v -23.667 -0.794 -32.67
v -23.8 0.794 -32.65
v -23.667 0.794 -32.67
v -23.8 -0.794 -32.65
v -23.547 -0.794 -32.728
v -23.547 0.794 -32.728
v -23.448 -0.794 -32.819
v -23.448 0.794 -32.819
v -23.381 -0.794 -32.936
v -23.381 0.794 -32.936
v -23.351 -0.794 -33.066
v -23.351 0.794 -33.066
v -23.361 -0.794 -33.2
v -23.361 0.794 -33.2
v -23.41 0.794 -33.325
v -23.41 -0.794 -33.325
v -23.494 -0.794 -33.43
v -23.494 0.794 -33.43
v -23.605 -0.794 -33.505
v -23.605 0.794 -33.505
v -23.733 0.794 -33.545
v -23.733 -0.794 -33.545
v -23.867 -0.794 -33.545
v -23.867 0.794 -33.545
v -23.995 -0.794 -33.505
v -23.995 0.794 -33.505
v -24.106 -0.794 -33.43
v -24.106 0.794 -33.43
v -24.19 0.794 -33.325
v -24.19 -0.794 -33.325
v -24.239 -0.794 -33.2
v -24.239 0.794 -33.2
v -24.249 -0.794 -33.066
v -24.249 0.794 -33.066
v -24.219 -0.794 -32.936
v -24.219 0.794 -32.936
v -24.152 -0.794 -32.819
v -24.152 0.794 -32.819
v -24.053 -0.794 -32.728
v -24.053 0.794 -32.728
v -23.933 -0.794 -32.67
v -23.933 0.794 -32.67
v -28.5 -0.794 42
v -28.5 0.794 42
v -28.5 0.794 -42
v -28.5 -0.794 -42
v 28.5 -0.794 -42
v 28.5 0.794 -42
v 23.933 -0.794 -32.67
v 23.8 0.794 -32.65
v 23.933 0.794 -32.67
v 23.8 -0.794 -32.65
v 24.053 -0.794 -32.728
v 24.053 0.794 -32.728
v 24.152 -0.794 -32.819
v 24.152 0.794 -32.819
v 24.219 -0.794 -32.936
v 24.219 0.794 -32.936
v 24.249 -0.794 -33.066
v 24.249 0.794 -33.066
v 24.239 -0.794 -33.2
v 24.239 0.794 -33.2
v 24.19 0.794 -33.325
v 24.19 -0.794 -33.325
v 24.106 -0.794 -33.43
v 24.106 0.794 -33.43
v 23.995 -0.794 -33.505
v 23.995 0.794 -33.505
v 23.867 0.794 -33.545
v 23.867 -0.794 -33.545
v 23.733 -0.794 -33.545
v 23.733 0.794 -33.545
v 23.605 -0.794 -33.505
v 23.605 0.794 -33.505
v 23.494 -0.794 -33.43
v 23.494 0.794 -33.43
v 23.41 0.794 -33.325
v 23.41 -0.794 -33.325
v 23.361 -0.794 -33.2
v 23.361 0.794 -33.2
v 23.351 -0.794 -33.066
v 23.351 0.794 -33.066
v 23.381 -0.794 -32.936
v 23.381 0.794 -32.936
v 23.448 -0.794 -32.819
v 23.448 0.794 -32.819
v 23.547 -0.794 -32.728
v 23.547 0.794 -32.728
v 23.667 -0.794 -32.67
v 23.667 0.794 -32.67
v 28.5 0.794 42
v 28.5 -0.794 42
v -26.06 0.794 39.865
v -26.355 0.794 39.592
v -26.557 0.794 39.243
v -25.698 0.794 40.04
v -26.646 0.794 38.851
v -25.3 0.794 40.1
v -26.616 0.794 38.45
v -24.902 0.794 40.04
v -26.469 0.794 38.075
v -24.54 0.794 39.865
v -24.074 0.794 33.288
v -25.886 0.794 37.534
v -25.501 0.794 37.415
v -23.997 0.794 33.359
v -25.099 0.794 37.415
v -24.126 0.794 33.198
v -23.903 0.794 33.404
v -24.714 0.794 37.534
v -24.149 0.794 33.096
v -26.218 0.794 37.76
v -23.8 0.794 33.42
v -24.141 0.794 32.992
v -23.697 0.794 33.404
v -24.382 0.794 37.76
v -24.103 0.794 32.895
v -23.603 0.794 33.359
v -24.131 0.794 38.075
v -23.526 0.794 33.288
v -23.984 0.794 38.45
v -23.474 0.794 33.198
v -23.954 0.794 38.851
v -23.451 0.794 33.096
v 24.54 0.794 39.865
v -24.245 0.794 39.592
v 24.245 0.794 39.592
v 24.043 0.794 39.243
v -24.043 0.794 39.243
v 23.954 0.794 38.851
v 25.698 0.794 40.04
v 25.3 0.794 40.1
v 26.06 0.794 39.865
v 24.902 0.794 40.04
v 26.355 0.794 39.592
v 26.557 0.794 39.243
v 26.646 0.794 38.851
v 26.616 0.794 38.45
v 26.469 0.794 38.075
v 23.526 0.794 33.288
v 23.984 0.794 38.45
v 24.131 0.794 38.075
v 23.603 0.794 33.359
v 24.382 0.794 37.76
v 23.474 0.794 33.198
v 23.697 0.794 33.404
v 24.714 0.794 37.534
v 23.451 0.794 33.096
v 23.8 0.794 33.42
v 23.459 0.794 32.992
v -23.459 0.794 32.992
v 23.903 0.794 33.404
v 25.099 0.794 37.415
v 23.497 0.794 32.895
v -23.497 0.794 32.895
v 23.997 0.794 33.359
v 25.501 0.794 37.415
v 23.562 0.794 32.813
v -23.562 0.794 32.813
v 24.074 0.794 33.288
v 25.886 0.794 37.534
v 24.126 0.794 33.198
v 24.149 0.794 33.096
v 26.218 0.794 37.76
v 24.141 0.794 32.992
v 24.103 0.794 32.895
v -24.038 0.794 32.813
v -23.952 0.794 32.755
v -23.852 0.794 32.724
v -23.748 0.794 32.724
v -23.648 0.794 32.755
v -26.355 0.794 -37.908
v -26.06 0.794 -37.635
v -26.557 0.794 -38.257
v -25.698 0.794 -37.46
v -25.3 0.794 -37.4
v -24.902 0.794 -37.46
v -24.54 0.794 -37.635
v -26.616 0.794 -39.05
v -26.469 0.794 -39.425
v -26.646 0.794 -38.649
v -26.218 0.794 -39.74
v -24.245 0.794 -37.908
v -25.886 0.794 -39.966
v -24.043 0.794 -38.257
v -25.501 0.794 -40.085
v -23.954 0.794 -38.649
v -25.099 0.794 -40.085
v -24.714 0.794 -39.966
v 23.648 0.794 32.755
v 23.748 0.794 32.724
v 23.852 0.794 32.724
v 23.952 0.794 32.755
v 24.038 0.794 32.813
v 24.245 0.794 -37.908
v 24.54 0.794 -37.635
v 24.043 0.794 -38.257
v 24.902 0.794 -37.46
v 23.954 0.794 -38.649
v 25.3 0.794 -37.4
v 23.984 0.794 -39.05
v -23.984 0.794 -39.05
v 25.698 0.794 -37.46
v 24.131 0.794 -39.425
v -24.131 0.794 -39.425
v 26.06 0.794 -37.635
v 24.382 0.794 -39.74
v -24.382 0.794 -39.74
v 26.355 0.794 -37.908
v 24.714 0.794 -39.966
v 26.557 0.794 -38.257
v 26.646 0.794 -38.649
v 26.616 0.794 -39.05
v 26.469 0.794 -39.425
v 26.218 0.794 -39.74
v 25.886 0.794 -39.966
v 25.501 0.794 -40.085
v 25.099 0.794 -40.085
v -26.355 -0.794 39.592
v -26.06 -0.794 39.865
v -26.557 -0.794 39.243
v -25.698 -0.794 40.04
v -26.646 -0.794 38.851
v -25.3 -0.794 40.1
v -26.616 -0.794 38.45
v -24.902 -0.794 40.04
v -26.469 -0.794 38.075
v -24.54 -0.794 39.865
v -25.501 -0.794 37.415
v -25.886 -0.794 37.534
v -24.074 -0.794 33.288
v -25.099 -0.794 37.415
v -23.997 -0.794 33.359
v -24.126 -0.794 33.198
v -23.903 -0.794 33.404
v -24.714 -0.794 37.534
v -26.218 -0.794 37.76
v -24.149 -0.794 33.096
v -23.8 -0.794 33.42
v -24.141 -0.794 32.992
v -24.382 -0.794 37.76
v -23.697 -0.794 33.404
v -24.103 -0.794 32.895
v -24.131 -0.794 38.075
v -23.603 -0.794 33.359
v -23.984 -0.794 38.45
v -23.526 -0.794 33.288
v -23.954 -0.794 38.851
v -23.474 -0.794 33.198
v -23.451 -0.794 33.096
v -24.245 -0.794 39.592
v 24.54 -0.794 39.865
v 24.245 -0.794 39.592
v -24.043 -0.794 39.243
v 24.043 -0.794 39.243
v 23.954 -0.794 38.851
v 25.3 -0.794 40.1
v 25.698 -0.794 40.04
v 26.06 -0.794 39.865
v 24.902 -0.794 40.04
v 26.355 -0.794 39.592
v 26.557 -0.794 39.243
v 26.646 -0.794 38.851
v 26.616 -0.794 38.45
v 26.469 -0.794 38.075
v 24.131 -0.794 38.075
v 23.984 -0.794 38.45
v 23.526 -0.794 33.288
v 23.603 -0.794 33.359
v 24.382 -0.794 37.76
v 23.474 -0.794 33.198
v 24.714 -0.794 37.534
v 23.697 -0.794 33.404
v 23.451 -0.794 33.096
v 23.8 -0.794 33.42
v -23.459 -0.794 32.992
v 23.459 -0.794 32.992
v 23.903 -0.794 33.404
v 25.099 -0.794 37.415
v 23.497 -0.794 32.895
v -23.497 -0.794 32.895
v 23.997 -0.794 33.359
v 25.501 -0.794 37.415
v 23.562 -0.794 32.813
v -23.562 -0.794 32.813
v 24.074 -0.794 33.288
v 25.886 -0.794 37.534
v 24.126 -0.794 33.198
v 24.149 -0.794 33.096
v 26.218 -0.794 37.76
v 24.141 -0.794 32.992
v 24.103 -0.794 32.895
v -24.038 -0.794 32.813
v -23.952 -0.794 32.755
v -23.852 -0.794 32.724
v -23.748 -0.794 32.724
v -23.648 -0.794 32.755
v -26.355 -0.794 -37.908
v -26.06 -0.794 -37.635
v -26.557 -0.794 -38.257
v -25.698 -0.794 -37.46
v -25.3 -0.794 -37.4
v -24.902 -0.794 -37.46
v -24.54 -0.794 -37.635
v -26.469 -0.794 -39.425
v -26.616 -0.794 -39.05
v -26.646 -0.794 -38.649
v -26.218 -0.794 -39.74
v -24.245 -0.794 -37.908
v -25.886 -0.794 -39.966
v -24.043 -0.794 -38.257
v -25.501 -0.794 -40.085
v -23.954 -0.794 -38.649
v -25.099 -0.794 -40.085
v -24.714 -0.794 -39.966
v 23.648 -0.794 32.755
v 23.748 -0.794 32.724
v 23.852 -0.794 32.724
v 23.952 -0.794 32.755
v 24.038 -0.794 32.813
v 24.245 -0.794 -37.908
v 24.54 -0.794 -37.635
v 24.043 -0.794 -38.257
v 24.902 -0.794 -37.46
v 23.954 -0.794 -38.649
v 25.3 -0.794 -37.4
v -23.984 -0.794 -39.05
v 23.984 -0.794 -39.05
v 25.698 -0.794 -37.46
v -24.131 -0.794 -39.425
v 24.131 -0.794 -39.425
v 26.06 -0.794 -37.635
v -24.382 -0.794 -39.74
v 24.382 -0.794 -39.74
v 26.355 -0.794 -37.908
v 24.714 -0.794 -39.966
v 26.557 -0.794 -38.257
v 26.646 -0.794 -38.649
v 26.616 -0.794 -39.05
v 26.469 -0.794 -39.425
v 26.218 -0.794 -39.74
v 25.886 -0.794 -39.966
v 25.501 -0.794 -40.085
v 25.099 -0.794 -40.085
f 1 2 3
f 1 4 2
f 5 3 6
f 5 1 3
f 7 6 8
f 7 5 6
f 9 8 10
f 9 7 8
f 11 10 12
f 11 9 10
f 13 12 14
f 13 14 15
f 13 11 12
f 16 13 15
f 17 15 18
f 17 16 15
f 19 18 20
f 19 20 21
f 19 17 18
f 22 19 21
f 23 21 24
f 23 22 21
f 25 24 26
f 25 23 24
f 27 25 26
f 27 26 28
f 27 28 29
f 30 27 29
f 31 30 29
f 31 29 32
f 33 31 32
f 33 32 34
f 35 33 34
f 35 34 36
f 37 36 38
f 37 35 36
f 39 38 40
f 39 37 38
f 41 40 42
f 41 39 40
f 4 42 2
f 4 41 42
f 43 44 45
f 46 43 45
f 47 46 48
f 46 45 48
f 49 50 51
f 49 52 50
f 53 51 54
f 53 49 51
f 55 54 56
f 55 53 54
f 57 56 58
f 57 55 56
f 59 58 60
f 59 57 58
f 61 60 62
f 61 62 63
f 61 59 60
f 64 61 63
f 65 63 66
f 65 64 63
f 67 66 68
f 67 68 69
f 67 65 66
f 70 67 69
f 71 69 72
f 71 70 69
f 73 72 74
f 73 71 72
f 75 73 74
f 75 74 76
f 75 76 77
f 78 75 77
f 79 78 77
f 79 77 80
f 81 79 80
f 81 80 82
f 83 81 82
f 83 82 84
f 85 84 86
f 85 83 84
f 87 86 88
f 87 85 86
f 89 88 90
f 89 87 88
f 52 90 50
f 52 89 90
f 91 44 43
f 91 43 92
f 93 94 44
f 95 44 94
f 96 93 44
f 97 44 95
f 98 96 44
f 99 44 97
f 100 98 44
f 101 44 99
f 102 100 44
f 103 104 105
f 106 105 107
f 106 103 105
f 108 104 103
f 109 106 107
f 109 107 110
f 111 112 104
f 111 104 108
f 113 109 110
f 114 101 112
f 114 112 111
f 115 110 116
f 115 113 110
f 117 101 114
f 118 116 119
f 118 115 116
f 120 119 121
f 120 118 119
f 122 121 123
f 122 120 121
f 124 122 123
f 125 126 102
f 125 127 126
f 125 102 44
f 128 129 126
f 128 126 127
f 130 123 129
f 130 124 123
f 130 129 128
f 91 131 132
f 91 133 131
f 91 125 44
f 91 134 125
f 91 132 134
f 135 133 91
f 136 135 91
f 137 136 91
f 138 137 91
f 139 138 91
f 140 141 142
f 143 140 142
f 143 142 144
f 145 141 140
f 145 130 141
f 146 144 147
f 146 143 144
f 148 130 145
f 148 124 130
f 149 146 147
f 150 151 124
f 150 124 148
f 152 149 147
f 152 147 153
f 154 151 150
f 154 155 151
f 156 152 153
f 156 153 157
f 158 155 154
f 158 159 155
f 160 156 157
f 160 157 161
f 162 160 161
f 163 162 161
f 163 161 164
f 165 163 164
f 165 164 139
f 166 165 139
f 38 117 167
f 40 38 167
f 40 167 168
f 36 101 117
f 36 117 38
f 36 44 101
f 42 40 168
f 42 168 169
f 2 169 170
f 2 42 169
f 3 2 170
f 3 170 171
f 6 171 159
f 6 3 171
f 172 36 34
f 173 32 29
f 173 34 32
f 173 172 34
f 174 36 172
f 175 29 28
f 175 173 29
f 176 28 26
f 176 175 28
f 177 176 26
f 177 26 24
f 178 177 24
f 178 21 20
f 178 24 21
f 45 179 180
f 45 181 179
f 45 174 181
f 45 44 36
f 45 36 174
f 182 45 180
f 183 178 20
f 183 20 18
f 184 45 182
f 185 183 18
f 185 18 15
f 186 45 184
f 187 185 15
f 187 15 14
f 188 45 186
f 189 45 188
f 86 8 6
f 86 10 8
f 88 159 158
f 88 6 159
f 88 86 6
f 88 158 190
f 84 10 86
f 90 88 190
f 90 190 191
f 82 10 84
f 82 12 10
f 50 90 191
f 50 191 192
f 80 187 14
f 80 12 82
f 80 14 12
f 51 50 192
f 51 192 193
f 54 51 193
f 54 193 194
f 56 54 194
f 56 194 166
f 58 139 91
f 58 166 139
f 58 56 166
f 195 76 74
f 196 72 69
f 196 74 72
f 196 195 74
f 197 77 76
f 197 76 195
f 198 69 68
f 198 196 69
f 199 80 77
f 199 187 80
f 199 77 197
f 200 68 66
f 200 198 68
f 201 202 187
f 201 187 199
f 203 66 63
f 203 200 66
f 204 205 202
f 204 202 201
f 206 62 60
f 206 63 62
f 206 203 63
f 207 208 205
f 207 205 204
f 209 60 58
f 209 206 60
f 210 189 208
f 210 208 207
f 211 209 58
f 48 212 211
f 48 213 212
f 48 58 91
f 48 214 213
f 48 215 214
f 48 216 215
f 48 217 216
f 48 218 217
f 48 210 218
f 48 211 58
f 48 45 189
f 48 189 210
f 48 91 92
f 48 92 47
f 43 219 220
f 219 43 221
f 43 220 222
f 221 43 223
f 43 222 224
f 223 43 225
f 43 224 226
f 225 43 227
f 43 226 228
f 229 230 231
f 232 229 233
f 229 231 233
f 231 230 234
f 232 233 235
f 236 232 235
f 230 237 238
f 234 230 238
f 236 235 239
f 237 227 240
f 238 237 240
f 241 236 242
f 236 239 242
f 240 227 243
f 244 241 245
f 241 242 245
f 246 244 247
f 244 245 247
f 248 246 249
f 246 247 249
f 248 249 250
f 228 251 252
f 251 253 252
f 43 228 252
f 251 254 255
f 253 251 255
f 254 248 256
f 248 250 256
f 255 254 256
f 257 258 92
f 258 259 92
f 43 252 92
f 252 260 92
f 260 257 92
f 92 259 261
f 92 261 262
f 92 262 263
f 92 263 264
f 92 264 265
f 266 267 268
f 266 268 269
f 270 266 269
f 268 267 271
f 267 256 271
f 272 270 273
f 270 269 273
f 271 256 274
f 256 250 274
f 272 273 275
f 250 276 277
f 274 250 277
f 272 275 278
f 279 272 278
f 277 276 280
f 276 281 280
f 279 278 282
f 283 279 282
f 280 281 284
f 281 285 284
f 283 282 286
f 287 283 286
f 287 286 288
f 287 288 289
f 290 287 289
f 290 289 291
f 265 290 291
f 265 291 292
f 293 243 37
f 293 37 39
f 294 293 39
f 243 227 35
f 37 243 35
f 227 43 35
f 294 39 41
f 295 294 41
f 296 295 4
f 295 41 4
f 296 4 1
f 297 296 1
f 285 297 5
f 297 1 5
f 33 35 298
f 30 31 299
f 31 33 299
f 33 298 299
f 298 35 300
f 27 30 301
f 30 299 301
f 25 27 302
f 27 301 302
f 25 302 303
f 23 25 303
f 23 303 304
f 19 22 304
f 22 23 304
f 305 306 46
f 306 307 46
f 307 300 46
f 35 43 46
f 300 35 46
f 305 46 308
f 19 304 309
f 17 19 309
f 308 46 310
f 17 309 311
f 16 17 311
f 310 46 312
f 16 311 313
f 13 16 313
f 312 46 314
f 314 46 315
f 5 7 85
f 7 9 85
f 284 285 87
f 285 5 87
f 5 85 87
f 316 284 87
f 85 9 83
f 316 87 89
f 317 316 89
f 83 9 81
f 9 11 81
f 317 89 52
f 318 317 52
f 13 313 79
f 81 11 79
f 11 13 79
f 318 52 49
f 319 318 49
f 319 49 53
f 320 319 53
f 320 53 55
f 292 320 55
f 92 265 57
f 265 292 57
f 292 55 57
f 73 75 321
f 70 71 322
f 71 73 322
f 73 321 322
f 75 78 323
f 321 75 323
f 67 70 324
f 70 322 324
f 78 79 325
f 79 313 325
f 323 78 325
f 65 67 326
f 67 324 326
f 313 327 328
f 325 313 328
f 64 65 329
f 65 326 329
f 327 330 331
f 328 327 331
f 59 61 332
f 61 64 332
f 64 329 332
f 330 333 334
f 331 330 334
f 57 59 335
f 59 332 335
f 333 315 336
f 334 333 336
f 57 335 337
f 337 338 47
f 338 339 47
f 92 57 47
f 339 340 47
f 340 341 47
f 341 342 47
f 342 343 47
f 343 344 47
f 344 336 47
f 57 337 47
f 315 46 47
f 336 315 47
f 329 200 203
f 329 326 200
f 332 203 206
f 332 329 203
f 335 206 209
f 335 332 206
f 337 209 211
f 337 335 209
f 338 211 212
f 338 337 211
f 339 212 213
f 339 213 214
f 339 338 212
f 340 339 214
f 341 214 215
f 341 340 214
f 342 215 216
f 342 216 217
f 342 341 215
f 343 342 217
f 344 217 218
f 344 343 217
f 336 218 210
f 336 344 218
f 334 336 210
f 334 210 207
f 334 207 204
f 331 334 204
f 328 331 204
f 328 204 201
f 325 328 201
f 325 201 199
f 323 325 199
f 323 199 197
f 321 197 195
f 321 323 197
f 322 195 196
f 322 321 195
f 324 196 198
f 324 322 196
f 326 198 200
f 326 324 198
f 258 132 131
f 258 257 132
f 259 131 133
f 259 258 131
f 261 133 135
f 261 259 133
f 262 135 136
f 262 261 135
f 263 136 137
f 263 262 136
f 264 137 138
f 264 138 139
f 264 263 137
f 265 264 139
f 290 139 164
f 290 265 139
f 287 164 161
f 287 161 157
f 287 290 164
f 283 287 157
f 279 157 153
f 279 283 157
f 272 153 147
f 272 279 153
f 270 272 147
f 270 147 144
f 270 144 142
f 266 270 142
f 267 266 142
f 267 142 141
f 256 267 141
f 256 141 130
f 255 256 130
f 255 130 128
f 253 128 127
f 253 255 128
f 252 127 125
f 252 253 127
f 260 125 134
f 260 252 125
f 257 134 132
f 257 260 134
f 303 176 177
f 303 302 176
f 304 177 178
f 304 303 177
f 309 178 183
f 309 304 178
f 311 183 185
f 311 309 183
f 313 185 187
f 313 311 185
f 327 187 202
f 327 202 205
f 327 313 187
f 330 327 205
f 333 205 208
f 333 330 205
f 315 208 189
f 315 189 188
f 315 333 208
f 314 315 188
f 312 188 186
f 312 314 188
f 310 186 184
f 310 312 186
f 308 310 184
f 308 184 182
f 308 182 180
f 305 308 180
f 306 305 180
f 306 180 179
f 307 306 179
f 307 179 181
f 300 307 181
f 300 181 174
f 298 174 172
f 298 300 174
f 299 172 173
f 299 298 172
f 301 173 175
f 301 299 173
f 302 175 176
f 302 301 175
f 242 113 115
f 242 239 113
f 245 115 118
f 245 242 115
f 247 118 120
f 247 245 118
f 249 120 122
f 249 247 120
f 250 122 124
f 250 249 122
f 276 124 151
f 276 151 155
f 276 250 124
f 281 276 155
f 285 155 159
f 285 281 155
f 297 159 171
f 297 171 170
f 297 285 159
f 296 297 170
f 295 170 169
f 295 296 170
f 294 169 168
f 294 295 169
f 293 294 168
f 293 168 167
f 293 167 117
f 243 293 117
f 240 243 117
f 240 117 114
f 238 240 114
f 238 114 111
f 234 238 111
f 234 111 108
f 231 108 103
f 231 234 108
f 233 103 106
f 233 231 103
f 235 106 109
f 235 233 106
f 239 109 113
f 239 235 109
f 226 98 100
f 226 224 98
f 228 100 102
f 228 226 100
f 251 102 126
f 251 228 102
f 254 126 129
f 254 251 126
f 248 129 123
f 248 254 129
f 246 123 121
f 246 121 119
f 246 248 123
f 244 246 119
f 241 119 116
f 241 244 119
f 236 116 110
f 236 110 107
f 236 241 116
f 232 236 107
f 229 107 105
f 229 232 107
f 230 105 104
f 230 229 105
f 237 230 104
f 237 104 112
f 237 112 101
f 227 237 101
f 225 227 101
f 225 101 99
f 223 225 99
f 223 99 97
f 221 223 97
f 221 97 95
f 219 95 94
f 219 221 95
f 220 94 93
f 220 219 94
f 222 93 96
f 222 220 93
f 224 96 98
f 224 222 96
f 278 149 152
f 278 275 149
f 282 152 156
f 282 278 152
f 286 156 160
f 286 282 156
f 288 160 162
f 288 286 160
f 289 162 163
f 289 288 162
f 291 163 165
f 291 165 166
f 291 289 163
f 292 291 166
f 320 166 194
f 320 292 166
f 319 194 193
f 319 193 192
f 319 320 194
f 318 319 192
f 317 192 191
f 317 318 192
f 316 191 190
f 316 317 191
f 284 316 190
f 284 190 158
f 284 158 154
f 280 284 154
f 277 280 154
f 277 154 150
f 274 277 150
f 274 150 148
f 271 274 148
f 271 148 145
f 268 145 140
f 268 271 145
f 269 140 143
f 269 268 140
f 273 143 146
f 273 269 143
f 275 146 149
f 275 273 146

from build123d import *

# Parameters (mm, degrees)
SKETCH2_W      = 57
SKETCH2_H      = 84
SKETCH2_R      = 1.35
SKETCH2_R_2    = 0.35
SKETCH2_R_3    = 0.45
EXTRUDE1_DEPTH = 0.79375


with BuildPart() as part:
    # Sketch2 → Extrude1 (new, symmetric)
    with BuildSketch(Plane(origin=(0, 0, 0), x_dir=(1, 0, 0), z_dir=(0, 1, 0))):
        Rectangle(SKETCH2_W, SKETCH2_H)
        with Locations(Location((25.3, 38.75, 0), (0, 0, 270))):
            Circle(SKETCH2_R, mode=Mode.SUBTRACT)
        with Locations(Location((25.3, -38.75, 0), (0, 0, 270))):
            Circle(SKETCH2_R, mode=Mode.SUBTRACT)
        with Locations(Location((-25.3, -38.75, 0), (0, 0, 270))):
            Circle(SKETCH2_R, mode=Mode.SUBTRACT)
        with Locations(Location((-25.3, 38.75, 0), (0, 0, 270))):
            Circle(SKETCH2_R, mode=Mode.SUBTRACT)
        with Locations(Location((23.8, -33.07, 0), (0, 0, 270))):
            Circle(SKETCH2_R_2, mode=Mode.SUBTRACT)
        with Locations(Location((-23.8, -33.07, 0), (0, 0, 270))):
            Circle(SKETCH2_R_2, mode=Mode.SUBTRACT)
        with Locations(Location((23.8, 33.1, 0), (0, 0, 270))):
            Circle(SKETCH2_R_3, mode=Mode.SUBTRACT)
        with Locations(Location((-23.8, 33.1, 0), (0, 0, 270))):
            Circle(SKETCH2_R_3, mode=Mode.SUBTRACT)
    extrude(amount=EXTRUDE1_DEPTH, both=True)


solid = part.part
